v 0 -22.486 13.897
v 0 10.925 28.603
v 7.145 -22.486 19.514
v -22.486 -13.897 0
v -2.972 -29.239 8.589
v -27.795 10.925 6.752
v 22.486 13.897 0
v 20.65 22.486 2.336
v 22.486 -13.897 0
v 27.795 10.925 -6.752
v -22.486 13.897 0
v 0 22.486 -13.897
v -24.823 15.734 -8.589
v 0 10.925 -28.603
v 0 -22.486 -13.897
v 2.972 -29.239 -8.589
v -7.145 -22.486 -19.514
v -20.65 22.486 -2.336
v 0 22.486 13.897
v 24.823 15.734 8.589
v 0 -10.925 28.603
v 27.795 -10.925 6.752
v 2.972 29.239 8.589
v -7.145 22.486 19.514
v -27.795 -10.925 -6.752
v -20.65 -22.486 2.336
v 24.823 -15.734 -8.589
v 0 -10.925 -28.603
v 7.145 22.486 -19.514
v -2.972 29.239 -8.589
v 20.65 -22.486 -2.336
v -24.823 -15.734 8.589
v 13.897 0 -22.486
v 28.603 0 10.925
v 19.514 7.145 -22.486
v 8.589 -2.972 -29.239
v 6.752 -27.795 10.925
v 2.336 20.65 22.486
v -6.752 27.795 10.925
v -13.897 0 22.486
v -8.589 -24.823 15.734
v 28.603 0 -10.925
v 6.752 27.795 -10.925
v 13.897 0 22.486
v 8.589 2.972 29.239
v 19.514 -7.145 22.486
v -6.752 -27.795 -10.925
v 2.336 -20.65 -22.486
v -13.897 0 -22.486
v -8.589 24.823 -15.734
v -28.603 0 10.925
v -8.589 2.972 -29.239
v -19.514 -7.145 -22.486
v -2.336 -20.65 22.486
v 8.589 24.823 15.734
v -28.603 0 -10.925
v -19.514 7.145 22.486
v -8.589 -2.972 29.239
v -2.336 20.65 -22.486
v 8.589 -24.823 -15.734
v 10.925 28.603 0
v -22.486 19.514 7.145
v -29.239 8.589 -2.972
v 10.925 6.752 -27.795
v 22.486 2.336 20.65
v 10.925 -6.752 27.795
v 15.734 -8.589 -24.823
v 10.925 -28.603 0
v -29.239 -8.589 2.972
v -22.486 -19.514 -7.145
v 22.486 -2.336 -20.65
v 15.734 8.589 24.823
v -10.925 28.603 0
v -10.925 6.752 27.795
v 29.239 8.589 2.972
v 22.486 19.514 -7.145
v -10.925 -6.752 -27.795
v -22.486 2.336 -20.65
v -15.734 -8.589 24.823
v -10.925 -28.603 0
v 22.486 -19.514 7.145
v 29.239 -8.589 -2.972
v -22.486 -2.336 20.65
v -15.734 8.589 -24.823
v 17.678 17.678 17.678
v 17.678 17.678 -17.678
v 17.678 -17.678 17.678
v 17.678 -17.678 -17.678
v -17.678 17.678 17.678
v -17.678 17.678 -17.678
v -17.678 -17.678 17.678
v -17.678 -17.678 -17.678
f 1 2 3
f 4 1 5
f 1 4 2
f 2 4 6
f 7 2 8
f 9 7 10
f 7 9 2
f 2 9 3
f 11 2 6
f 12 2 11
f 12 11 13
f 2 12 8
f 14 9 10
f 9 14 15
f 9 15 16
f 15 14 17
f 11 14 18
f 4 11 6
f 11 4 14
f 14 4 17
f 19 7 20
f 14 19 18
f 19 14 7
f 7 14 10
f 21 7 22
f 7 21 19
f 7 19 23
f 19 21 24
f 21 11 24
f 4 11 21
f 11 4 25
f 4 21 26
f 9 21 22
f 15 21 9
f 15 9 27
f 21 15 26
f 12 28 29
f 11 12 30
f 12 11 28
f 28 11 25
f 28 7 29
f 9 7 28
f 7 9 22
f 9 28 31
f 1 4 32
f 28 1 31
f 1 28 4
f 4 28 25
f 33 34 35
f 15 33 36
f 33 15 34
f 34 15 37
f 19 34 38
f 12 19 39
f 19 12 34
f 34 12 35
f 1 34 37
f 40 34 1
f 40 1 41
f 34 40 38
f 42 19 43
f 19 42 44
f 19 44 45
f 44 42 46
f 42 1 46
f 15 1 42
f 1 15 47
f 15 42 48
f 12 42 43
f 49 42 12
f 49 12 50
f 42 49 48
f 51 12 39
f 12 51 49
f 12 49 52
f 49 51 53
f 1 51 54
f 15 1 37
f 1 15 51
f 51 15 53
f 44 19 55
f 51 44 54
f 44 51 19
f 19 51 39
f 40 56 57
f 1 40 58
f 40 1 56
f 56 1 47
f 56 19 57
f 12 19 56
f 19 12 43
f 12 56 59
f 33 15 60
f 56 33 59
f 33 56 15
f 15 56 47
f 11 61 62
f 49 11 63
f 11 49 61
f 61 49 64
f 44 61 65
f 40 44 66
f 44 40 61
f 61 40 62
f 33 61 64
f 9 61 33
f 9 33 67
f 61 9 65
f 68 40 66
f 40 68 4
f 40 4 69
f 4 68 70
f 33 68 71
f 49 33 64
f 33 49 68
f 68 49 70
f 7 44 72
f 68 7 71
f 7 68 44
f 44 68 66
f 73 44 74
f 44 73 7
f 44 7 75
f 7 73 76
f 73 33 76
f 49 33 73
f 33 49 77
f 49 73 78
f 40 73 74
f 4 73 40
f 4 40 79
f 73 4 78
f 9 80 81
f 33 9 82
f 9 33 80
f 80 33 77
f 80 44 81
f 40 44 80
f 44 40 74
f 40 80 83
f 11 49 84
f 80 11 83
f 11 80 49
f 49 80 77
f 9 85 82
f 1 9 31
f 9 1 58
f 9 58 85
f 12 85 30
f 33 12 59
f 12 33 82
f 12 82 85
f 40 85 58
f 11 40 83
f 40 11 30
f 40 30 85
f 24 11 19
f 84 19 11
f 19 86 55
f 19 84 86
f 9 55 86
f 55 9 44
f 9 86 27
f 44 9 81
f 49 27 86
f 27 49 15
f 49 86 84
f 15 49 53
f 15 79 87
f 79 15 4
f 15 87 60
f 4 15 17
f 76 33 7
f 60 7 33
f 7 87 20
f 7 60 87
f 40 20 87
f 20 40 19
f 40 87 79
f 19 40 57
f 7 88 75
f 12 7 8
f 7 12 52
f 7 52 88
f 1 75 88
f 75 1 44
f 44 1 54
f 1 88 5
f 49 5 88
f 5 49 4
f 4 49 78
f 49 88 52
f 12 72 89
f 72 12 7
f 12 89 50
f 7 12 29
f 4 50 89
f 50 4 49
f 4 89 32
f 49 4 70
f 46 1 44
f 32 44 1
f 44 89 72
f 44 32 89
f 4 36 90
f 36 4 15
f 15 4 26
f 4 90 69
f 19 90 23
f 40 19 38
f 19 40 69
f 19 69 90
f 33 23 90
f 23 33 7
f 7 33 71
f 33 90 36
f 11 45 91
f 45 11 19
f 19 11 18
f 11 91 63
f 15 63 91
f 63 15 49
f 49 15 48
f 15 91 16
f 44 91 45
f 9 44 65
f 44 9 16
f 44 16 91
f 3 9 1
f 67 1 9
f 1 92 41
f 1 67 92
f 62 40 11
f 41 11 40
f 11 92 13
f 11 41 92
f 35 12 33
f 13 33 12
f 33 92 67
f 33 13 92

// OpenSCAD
// Great Hexagonal Hexecontahedron
//   coords via: http://dmccooey.com/polyhedra/GreatHexagonalHexecontahedron.html
scaling_factor = 50;
$fn = 50;

C0  = sqrt(sqrt(5) - 1 - 2 * sqrt(2 * (5 * sqrt(5) - 11))) / 4;
C1  = sqrt(2 * (1 - 2 * sqrt(sqrt(5) - 2))) / 4;
C2  = (3 * sqrt(2) - sqrt(10)) / 8;
C3  = sqrt(2 * (3 - sqrt(5) - sqrt(2 * (5 * sqrt(5) - 11)))) / 4;
C4  = sqrt(2 * (sqrt(5) - 2)) / 4;
C5  = (sqrt(10) - sqrt(2)) / 8;
C6  = sqrt(sqrt(5) - 1) / 4;
C7  = sqrt(2 * (4 - sqrt(5) - 2 * sqrt(sqrt(5) - 2))) / 4;
C8  = sqrt(2) / 4;
C9  = sqrt(sqrt(5) - 1 + 2 * sqrt(2 * (5 * sqrt(5) - 11))) / 4;
C10 = sqrt(2 * (3 - sqrt(5) + sqrt(2 * (5 * sqrt(5) - 11)))) / 4;
C11 = sqrt(1 + sqrt(5)) / 4;
C12 = sqrt(2 * (1 + 2 * sqrt(sqrt(5) - 2))) / 4;
C13 = sqrt(sqrt(5) - 1) / 2;
C14 = (sqrt(2) + sqrt(10)) / 8;
C15 = sqrt(2 * (4 - sqrt(5) + 2 * sqrt(sqrt(5) - 2))) / 4;

vertices = [
  [  C4,   C1,  C15], [  C4,  -C1, -C15], [ -C4,  -C1,  C15], [ -C4,   C1, -C15],
  [ C15,   C4,   C1], [ C15,  -C4,  -C1], [-C15,  -C4,   C1], [-C15,   C4,  -C1],
  [  C1,  C15,   C4], [  C1, -C15,  -C4], [ -C1, -C15,   C4], [ -C1,  C15,  -C4],
  [ 0.0,   C5,  C14], [ 0.0,   C5, -C14], [ 0.0,  -C5,  C14], [ 0.0,  -C5, -C14],
  [ C14,  0.0,   C5], [ C14,  0.0,  -C5], [-C14,  0.0,   C5], [-C14,  0.0,  -C5],
  [  C5,  C14,  0.0], [  C5, -C14,  0.0], [ -C5,  C14,  0.0], [ -C5, -C14,  0.0],
  [  C5,  -C2,  C13], [  C5,   C2, -C13], [ -C5,   C2,  C13], [ -C5,  -C2, -C13],
  [ C13,  -C5,   C2], [ C13,   C5,  -C2], [-C13,   C5,   C2], [-C13,  -C5,  -C2],
  [  C2, -C13,   C5], [  C2,  C13,  -C5], [ -C2,  C13,   C5], [ -C2, -C13,  -C5],
  [  C7,   C4,  C12], [  C7,  -C4, -C12], [ -C7,  -C4,  C12], [ -C7,   C4, -C12],
  [ C12,   C7,   C4], [ C12,  -C7,  -C4], [-C12,  -C7,   C4], [-C12,   C7,  -C4],
  [  C4,  C12,   C7], [  C4, -C12,  -C7], [ -C4, -C12,   C7], [ -C4,  C12,  -C7],
  [  C6,  0.0,  C11], [  C6,  0.0,  C11], [  C6,  0.0, -C11], [  C6,  0.0, -C11],
  [ -C6,  0.0,  C11], [ -C6,  0.0,  C11], [ -C6,  0.0, -C11], [ -C6,  0.0, -C11],
  [ C11,   C6,  0.0], [ C11,   C6,  0.0], [ C11,  -C6,  0.0], [ C11,  -C6,  0.0],
  [-C11,   C6,  0.0], [-C11,   C6,  0.0], [-C11,  -C6,  0.0], [-C11,  -C6,  0.0],
  [ 0.0,  C11,   C6], [ 0.0,  C11,   C6], [ 0.0,  C11,  -C6], [ 0.0,  C11,  -C6],
  [ 0.0, -C11,   C6], [ 0.0, -C11,   C6], [ 0.0, -C11,  -C6], [ 0.0, -C11,  -C6],
  [  C9,  -C3,  C11], [  C9,   C3, -C11], [ -C9,   C3,  C11], [ -C9,  -C3, -C11],
  [ C11,  -C9,   C3], [ C11,   C9,  -C3], [-C11,   C9,   C3], [-C11,  -C9,  -C3],
  [  C3, -C11,   C9], [  C3,  C11,  -C9], [ -C3,  C11,   C9], [ -C3, -C11,  -C9],
  [  C0,  C10,  C11], [  C0, -C10, -C11], [ -C0, -C10,  C11], [ -C0,  C10, -C11],
  [ C11,   C0,  C10], [ C11,  -C0, -C10], [-C11,  -C0,  C10], [-C11,   C0, -C10],
  [ C10,  C11,   C0], [ C10, -C11,  -C0], [-C10, -C11,   C0], [-C10,  C11,  -C0],
  [  C8,   C8,   C8], [  C8,   C8,  -C8], [  C8,  -C8,   C8], [  C8,  -C8,  -C8],
  [ -C8,   C8,   C8], [ -C8,   C8,  -C8], [ -C8,  -C8,   C8], [ -C8,  -C8,  -C8]
];

faces = [
  [ 12, 30, 62, 10, 68, 80], [ 12, 80, 59, 29, 57, 92], [ 12, 92, 67, 43, 60, 30], 
  [ 13, 29, 59,  9, 71, 83], [ 13, 83, 62, 30, 60, 95], [ 13, 95, 64, 40, 57, 29], 
  [ 14, 28, 56,  8, 65, 82], [ 14, 82, 61, 31, 63, 94], [ 14, 94, 70, 41, 58, 28], 
  [ 15, 31, 61, 11, 66, 81], [ 15, 81, 56, 28, 58, 93], [ 15, 93, 69, 42, 63, 31], 
  [ 16, 32, 70,  1, 51, 73], [ 16, 73, 67, 34, 65, 84], [ 16, 84, 52, 46, 68, 32], 
  [ 17, 33, 64,  0, 48, 72], [ 17, 72, 69, 35, 71, 85], [ 17, 85, 55, 47, 66, 33], 
  [ 18, 34, 67,  3, 54, 75], [ 18, 75, 70, 32, 68, 86], [ 18, 86, 49, 44, 65, 34], 
  [ 19, 35, 69,  2, 53, 74], [ 19, 74, 64, 33, 66, 87], [ 19, 87, 50, 45, 71, 35], 
  [ 20, 25, 55,  7, 60, 78], [ 20, 78, 52, 24, 48, 88], [ 20, 88, 59, 37, 51, 25], 
  [ 21, 24, 52,  6, 63, 79], [ 21, 79, 55, 25, 51, 89], [ 21, 89, 56, 36, 48, 24], 
  [ 22, 26, 49,  4, 57, 77], [ 22, 77, 50, 27, 54, 91], [ 22, 91, 62, 38, 53, 26], 
  [ 23, 27, 50,  5, 58, 76], [ 23, 76, 49, 26, 53, 90], [ 23, 90, 61, 39, 54, 27], 
  [ 96,  2, 69, 93, 58,  5], [ 96,  5, 50, 87, 66, 11], [ 96, 11, 61, 90, 53,  2], 
  [ 97, 39, 61, 82, 65, 44], [ 97, 44, 49, 76, 58, 41], [ 97, 41, 70, 75, 54, 39], 
  [ 98, 38, 62, 83, 71, 45], [ 98, 45, 50, 77, 57, 40], [ 98, 40, 64, 74, 53, 38], 
  [ 99,  3, 67, 92, 57,  4], [ 99,  4, 49, 86, 68, 10], [ 99, 10, 62, 91, 54,  3], 
  [100, 36, 56, 81, 66, 47], [100, 47, 55, 79, 63, 42], [100, 42, 69, 72, 48, 36], 
  [101,  1, 70, 94, 63,  6], [101,  6, 52, 84, 65,  8], [101,  8, 56, 89, 51,  1], 
  [102,  0, 64, 95, 60,  7], [102,  7, 55, 85, 71,  9], [102,  9, 59, 88, 48,  0], 
  [103, 37, 59, 80, 68, 46], [103, 46, 52, 78, 60, 43], [103, 43, 67, 73, 51, 37]
];

scale(scaling_factor) {
  polyhedron(points=vertices, faces=faces, convexity=50);
};
